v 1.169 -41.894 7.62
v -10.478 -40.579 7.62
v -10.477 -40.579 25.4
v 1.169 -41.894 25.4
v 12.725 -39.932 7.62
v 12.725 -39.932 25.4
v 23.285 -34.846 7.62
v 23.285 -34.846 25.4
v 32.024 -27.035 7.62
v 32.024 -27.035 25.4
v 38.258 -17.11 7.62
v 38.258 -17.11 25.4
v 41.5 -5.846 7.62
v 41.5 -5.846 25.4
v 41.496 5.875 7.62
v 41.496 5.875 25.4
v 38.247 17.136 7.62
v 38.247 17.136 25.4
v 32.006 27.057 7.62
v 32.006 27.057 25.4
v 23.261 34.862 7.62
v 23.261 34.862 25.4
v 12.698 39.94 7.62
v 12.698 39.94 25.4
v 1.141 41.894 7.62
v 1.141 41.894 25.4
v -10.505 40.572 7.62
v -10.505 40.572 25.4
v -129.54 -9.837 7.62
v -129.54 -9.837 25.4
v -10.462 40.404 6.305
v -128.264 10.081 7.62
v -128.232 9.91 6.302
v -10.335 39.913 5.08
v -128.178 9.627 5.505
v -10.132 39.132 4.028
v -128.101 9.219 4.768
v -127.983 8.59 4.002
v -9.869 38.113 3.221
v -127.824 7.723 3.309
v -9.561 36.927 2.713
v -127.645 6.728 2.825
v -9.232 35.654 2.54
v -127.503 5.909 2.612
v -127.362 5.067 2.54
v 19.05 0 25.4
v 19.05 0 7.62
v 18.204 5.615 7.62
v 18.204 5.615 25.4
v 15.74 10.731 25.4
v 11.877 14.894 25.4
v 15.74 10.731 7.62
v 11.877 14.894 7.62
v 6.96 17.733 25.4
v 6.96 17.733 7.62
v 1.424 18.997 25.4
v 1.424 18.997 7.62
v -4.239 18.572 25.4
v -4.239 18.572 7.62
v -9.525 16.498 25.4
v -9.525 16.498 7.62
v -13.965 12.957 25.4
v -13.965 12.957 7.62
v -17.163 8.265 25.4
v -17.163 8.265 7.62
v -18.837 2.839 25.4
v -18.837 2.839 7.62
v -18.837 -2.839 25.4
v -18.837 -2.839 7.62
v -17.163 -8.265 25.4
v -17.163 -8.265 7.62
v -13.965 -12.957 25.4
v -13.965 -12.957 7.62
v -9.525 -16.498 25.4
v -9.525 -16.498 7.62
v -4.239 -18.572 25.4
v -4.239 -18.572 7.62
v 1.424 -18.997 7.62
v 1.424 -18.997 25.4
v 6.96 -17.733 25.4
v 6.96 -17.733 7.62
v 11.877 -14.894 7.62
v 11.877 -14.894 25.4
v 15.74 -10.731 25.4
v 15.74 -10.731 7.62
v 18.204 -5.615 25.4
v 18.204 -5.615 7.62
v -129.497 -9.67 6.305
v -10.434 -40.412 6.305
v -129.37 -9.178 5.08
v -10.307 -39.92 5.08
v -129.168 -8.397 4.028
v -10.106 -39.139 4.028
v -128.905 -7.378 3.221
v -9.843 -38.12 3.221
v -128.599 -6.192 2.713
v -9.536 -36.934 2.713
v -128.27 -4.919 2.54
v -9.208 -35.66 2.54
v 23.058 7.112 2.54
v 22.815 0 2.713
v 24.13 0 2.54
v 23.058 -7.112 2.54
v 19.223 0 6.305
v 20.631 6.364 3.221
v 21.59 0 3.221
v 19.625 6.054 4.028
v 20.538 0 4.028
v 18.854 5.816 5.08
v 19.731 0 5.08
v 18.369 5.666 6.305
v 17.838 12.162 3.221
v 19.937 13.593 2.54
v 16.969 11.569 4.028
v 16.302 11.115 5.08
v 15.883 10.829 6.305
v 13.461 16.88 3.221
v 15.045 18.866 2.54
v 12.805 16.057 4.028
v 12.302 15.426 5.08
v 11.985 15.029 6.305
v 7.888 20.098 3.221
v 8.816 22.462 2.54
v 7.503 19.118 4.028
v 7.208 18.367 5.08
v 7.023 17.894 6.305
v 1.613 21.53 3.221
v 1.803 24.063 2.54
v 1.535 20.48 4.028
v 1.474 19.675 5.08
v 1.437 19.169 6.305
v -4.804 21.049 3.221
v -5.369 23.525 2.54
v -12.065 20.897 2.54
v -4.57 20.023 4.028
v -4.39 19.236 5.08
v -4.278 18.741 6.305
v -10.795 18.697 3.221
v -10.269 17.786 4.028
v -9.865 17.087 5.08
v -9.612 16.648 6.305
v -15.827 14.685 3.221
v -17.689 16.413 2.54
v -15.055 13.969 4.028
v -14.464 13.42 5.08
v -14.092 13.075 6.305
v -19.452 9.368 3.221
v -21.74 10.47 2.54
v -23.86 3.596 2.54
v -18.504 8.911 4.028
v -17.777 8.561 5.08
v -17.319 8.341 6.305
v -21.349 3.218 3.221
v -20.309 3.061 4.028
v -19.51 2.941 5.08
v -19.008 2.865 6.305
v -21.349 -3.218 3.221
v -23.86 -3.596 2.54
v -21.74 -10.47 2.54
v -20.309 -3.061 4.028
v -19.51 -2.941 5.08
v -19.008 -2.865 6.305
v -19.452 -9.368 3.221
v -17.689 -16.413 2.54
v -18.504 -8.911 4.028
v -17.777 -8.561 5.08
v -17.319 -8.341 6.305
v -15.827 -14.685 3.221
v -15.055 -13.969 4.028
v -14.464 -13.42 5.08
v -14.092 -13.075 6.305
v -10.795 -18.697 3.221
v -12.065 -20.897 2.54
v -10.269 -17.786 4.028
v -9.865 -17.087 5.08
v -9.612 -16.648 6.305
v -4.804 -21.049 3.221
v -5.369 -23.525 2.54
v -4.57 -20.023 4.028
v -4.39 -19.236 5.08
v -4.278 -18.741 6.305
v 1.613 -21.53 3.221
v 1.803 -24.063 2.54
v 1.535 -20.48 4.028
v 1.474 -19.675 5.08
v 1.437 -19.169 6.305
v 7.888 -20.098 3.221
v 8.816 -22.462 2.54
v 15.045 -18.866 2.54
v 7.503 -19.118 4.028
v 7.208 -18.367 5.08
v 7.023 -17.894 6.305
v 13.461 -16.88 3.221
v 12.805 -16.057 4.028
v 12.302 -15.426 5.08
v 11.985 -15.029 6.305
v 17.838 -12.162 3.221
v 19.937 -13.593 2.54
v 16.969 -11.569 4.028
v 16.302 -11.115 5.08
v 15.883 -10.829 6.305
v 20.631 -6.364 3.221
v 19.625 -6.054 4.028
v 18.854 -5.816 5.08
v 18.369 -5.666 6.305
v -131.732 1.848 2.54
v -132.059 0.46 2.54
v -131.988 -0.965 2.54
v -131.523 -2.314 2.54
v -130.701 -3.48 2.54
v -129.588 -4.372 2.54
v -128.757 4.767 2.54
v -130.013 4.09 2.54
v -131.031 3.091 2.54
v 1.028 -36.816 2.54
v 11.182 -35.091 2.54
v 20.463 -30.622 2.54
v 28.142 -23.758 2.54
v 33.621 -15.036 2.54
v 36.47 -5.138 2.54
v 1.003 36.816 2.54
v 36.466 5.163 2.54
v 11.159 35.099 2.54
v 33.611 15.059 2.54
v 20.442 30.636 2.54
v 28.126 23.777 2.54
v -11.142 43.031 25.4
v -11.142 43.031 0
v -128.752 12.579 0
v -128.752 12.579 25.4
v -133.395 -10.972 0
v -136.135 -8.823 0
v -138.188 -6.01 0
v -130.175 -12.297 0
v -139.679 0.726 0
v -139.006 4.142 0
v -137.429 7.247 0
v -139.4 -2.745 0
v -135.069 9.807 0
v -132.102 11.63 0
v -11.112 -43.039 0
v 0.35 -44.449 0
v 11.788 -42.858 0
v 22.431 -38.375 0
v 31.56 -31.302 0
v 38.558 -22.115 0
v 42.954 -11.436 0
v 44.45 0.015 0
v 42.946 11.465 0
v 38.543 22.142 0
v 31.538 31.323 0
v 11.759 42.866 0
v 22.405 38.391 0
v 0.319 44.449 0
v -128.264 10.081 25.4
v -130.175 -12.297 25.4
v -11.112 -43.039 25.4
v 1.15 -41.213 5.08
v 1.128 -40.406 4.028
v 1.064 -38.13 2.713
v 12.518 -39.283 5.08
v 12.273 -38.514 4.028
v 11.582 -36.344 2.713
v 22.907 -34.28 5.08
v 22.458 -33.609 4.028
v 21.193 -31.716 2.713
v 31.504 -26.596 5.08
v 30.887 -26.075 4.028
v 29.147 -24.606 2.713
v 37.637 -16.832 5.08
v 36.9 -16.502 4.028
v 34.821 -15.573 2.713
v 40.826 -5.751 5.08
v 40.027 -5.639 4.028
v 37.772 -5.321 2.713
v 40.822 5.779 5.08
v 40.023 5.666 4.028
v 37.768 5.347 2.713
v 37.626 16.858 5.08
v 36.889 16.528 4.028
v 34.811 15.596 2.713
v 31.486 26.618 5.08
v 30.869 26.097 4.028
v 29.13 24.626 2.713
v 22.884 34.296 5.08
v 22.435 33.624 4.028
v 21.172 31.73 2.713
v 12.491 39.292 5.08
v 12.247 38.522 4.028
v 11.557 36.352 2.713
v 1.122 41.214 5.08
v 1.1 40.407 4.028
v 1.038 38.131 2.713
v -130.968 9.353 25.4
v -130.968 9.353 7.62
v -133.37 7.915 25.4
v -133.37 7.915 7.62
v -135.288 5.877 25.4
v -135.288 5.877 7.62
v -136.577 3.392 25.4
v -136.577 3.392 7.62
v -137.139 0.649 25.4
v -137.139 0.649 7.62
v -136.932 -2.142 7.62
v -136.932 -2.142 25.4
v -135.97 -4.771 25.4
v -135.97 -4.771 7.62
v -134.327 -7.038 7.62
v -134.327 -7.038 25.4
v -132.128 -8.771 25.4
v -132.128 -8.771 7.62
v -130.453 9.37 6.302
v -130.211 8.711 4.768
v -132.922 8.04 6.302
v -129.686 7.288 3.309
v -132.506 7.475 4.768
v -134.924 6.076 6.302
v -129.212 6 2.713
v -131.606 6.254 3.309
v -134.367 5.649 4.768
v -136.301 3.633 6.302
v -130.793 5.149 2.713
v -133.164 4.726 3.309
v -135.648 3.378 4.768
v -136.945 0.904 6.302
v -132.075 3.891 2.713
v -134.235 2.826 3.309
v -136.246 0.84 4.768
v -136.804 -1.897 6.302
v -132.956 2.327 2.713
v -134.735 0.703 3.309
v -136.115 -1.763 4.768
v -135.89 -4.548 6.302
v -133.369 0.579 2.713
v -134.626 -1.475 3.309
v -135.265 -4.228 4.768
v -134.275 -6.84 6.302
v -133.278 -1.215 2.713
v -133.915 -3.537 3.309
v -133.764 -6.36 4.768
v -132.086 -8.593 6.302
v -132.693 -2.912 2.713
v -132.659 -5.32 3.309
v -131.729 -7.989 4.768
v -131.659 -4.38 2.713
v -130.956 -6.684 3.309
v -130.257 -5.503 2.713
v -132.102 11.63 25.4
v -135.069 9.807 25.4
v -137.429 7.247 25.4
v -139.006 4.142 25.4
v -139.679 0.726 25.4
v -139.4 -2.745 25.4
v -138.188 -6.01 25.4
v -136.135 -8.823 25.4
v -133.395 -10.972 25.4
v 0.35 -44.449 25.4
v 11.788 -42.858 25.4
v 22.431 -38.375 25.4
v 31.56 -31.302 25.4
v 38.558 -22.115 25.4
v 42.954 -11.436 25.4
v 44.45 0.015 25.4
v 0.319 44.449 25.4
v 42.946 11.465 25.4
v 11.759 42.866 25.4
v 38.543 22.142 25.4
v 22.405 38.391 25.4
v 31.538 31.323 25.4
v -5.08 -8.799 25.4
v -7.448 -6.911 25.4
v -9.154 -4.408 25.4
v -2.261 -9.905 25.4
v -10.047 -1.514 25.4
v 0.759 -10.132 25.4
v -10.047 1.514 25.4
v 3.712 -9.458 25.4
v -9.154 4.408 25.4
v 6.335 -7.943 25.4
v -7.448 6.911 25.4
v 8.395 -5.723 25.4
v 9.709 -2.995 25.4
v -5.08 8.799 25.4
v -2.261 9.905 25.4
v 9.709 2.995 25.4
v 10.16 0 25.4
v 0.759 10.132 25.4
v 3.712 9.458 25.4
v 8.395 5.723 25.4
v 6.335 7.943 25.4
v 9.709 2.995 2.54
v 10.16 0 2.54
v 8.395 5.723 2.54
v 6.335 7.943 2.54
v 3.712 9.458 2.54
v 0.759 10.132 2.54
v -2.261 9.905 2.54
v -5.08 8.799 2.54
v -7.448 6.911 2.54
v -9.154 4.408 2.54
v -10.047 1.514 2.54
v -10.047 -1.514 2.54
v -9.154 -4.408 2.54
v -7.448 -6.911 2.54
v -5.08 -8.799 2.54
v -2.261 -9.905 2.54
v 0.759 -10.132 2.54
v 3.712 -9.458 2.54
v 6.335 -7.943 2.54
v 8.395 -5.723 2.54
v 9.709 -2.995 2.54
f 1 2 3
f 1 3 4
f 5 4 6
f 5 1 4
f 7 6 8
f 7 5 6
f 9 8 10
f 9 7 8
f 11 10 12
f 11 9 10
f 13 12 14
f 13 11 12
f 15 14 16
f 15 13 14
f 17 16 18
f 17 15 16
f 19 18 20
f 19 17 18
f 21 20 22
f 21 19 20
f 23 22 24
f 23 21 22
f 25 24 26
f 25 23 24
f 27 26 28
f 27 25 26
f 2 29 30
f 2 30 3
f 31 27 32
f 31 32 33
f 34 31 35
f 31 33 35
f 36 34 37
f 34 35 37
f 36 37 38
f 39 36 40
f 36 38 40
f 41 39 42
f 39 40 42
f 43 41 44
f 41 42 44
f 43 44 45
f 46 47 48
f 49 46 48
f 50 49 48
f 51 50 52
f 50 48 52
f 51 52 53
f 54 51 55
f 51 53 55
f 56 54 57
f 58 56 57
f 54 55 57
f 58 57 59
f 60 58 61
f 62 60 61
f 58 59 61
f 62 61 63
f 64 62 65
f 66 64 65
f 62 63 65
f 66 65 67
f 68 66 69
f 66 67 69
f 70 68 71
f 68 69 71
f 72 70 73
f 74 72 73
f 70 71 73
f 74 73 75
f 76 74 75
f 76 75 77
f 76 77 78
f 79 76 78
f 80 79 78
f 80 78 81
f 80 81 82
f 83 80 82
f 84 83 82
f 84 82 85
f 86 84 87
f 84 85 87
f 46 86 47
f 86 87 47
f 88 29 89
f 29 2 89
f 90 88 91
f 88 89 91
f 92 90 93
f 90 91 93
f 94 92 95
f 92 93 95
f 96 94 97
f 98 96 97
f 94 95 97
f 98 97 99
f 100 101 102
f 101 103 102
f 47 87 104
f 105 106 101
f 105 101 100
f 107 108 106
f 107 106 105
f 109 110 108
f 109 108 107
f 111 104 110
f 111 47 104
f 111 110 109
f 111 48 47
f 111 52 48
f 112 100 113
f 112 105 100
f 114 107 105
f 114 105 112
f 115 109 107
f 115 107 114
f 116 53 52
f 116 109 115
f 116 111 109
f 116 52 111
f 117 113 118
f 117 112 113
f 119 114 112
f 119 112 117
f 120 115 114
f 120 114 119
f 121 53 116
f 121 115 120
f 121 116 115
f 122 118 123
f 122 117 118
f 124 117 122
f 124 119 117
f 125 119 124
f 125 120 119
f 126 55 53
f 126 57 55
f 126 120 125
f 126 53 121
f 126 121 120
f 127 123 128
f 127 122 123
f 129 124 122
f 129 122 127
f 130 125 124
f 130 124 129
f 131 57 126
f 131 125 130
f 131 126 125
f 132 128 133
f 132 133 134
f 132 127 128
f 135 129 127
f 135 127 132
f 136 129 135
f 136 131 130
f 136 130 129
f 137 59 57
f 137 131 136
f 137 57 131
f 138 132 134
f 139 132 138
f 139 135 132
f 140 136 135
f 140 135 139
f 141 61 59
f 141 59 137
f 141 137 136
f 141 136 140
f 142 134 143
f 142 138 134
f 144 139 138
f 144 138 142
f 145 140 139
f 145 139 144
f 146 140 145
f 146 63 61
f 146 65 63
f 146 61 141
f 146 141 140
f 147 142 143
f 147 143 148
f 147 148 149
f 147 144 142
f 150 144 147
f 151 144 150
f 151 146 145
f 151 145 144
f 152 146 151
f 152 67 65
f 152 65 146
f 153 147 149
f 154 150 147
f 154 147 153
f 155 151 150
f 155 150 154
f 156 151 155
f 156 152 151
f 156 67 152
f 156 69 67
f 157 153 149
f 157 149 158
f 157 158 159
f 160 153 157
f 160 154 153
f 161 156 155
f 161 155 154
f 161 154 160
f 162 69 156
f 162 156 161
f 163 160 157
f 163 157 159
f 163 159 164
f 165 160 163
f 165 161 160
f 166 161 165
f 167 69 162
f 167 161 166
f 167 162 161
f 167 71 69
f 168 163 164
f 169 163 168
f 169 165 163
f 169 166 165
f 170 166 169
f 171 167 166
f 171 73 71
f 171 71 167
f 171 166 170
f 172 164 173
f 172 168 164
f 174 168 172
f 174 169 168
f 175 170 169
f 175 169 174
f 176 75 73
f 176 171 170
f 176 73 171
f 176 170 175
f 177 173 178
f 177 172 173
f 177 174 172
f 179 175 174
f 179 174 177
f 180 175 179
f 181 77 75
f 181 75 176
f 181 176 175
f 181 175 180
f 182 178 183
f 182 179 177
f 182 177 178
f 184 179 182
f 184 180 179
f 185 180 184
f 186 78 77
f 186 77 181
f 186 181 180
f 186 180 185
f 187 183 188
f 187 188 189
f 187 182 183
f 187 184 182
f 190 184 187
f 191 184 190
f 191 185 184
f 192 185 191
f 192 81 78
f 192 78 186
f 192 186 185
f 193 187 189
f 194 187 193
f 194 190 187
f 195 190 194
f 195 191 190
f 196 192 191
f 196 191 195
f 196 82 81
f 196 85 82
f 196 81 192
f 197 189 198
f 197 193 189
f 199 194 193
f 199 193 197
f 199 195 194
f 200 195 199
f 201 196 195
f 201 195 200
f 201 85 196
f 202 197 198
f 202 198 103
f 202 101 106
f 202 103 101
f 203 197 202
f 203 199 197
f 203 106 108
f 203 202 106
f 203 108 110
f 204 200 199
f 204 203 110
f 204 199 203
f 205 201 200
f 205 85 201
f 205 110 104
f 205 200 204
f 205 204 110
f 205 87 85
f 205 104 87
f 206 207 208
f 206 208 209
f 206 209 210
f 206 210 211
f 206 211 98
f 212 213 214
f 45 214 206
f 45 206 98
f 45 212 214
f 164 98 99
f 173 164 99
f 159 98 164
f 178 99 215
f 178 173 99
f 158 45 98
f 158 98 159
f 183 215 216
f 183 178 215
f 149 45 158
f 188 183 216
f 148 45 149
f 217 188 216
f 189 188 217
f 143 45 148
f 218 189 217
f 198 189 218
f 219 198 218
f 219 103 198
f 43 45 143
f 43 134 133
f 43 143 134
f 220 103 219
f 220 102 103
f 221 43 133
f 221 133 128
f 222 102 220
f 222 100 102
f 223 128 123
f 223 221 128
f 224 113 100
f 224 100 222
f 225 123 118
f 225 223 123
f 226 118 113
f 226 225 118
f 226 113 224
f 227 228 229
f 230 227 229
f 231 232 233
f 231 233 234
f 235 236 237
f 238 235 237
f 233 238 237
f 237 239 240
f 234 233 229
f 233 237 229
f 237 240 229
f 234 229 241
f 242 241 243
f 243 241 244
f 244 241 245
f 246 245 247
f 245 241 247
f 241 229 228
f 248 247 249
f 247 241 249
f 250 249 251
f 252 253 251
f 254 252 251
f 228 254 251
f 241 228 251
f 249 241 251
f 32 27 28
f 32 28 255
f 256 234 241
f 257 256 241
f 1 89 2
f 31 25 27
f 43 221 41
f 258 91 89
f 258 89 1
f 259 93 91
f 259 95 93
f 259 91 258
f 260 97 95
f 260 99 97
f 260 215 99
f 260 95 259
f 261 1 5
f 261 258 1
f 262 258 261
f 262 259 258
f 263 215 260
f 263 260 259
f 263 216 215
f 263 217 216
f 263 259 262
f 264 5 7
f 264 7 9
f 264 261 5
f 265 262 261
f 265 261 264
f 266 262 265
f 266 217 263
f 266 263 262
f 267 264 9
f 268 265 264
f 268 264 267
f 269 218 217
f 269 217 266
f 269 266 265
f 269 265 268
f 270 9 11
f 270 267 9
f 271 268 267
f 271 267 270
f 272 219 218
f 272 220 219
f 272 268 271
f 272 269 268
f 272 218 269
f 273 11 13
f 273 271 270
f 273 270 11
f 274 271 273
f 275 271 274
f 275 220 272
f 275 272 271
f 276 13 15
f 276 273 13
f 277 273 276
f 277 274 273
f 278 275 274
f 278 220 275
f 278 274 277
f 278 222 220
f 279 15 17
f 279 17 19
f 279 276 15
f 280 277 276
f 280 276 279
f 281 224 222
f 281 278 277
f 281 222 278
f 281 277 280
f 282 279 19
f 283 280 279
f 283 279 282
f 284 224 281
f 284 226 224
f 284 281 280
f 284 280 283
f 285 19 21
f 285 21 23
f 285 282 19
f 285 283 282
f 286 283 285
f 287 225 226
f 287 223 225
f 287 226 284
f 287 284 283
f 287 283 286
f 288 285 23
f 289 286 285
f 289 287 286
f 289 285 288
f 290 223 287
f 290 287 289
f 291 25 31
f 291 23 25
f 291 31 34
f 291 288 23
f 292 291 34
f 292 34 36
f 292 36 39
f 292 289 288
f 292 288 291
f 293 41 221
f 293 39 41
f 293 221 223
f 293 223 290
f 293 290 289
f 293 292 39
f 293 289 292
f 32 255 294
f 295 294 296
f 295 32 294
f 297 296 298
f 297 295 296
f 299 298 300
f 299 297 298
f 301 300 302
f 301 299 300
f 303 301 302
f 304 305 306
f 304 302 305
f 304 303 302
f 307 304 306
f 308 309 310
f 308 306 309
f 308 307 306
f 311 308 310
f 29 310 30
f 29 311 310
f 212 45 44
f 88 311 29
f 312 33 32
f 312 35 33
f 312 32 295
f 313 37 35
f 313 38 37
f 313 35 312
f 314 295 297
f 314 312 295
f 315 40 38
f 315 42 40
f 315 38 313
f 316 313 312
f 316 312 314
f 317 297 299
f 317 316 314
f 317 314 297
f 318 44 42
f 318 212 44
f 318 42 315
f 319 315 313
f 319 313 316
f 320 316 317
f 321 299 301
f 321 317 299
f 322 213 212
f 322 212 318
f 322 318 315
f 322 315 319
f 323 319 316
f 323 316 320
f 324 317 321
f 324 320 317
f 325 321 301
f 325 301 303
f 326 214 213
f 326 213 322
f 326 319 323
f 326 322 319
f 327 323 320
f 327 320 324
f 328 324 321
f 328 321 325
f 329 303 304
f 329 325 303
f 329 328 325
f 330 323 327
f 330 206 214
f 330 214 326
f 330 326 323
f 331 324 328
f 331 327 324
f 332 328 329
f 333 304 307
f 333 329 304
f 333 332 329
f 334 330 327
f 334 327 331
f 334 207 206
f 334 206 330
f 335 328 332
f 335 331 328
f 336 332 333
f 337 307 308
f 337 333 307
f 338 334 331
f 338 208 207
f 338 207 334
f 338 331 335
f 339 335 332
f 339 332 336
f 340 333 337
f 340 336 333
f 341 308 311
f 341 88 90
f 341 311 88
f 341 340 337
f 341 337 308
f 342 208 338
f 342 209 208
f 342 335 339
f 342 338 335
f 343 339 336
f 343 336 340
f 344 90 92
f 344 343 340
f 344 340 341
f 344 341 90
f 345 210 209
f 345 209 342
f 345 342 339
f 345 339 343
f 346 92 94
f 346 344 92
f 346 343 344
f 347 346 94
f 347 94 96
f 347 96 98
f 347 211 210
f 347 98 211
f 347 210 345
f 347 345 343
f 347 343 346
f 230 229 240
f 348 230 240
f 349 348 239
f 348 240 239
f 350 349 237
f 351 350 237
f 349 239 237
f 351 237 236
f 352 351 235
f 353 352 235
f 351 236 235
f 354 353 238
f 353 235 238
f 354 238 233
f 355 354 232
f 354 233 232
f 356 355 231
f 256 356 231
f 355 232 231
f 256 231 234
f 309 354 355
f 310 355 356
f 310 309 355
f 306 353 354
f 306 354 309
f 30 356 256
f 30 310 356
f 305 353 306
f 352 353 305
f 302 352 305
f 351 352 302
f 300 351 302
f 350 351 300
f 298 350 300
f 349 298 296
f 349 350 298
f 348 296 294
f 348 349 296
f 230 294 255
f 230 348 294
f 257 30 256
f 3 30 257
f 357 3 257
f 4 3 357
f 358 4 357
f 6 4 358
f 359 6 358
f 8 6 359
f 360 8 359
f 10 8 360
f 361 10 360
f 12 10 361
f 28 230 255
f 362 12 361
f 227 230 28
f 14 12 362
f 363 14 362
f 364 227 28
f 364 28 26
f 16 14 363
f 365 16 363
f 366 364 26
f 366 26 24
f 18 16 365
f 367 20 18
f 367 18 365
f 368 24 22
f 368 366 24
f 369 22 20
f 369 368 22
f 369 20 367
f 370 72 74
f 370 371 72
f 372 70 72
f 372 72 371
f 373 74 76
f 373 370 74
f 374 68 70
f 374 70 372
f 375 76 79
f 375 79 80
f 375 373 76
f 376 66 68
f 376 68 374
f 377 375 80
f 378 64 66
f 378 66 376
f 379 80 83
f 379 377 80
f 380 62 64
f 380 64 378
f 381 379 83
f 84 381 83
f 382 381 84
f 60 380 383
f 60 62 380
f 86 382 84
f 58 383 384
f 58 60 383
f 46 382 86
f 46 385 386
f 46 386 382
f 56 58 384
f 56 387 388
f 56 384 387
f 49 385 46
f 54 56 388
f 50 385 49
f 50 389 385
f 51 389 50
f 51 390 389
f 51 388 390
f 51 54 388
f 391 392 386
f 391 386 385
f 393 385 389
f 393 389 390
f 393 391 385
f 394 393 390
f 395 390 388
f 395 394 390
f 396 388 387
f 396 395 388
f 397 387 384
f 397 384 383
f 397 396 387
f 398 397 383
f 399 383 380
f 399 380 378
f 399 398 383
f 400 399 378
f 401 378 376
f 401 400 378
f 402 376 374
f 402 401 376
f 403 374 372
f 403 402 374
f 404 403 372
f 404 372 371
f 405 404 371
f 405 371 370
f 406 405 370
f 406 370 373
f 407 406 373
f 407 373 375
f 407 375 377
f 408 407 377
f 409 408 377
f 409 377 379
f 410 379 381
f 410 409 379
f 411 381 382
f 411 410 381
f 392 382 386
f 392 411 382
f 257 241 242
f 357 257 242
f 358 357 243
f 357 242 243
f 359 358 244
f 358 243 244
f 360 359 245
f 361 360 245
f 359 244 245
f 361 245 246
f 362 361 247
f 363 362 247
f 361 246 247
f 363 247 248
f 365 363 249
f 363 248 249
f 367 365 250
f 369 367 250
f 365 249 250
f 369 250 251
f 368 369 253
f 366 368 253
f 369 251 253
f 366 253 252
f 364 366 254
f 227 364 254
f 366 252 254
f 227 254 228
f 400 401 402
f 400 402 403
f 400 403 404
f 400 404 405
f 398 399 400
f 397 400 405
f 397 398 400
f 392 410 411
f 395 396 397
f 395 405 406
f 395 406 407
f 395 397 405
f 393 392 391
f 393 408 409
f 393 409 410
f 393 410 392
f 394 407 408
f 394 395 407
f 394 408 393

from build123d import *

# Parameters (mm, degrees)
F1_DEPTH = 25.4
F2_T     = -2.54
F3_R     = 19.05
F3_R_2   = 10.16
F4_DEPTH = 22.86
F5_R     = 5.08


with BuildPart() as f1:
    # F0 (on Top) → F1 (new body)
    with BuildSketch(Plane.XY):
        with BuildLine():
            Line((-130.175, -12.2967221242), (-11.1125, -43.0385274347))
            ThreePointArc((-11.1125, -43.0385274347), (44.4499974135, 0.0151638522), (-11.1418620852, 43.0309354915))
            Line((-11.1418620852, 43.0309354915), (-128.75155606, 12.578634718))
            ThreePointArc((-128.75155606, 12.578634718), (-139.6792579893, 0.7255458912), (-130.175, -12.2967221242))
        make_face()
    extrude(amount=F1_DEPTH)

    # F2
    f2_openings = [f1.faces().sort_by_distance(p)[0] for p in [
        (-33.44475, -0.010622, 25.4),
    ]]
    offset(amount=F2_T, openings=f2_openings, kind=Kind.INTERSECTION)

    # F3 (on face) → F4 (join, through all)
    with BuildSketch(Plane.XY.offset(2.54)):
        Circle(F3_R)
        Circle(F3_R_2, mode=Mode.SUBTRACT)
    extrude(amount=F4_DEPTH)

    # F5
    f5_edges = [f1.edges().sort_by_distance(p)[0] for p in [
        (-19.05, 0, 2.54),
        (-69.384764, 25.326524, 2.54),
        (41.909998, 0.014297, 2.54),
        (-137.139228, 0.649358, 2.54),
        (-70.00875, -25.20828, 2.54),
    ]]
    fillet(f5_edges, radius=F5_R)


solid = f1.part
